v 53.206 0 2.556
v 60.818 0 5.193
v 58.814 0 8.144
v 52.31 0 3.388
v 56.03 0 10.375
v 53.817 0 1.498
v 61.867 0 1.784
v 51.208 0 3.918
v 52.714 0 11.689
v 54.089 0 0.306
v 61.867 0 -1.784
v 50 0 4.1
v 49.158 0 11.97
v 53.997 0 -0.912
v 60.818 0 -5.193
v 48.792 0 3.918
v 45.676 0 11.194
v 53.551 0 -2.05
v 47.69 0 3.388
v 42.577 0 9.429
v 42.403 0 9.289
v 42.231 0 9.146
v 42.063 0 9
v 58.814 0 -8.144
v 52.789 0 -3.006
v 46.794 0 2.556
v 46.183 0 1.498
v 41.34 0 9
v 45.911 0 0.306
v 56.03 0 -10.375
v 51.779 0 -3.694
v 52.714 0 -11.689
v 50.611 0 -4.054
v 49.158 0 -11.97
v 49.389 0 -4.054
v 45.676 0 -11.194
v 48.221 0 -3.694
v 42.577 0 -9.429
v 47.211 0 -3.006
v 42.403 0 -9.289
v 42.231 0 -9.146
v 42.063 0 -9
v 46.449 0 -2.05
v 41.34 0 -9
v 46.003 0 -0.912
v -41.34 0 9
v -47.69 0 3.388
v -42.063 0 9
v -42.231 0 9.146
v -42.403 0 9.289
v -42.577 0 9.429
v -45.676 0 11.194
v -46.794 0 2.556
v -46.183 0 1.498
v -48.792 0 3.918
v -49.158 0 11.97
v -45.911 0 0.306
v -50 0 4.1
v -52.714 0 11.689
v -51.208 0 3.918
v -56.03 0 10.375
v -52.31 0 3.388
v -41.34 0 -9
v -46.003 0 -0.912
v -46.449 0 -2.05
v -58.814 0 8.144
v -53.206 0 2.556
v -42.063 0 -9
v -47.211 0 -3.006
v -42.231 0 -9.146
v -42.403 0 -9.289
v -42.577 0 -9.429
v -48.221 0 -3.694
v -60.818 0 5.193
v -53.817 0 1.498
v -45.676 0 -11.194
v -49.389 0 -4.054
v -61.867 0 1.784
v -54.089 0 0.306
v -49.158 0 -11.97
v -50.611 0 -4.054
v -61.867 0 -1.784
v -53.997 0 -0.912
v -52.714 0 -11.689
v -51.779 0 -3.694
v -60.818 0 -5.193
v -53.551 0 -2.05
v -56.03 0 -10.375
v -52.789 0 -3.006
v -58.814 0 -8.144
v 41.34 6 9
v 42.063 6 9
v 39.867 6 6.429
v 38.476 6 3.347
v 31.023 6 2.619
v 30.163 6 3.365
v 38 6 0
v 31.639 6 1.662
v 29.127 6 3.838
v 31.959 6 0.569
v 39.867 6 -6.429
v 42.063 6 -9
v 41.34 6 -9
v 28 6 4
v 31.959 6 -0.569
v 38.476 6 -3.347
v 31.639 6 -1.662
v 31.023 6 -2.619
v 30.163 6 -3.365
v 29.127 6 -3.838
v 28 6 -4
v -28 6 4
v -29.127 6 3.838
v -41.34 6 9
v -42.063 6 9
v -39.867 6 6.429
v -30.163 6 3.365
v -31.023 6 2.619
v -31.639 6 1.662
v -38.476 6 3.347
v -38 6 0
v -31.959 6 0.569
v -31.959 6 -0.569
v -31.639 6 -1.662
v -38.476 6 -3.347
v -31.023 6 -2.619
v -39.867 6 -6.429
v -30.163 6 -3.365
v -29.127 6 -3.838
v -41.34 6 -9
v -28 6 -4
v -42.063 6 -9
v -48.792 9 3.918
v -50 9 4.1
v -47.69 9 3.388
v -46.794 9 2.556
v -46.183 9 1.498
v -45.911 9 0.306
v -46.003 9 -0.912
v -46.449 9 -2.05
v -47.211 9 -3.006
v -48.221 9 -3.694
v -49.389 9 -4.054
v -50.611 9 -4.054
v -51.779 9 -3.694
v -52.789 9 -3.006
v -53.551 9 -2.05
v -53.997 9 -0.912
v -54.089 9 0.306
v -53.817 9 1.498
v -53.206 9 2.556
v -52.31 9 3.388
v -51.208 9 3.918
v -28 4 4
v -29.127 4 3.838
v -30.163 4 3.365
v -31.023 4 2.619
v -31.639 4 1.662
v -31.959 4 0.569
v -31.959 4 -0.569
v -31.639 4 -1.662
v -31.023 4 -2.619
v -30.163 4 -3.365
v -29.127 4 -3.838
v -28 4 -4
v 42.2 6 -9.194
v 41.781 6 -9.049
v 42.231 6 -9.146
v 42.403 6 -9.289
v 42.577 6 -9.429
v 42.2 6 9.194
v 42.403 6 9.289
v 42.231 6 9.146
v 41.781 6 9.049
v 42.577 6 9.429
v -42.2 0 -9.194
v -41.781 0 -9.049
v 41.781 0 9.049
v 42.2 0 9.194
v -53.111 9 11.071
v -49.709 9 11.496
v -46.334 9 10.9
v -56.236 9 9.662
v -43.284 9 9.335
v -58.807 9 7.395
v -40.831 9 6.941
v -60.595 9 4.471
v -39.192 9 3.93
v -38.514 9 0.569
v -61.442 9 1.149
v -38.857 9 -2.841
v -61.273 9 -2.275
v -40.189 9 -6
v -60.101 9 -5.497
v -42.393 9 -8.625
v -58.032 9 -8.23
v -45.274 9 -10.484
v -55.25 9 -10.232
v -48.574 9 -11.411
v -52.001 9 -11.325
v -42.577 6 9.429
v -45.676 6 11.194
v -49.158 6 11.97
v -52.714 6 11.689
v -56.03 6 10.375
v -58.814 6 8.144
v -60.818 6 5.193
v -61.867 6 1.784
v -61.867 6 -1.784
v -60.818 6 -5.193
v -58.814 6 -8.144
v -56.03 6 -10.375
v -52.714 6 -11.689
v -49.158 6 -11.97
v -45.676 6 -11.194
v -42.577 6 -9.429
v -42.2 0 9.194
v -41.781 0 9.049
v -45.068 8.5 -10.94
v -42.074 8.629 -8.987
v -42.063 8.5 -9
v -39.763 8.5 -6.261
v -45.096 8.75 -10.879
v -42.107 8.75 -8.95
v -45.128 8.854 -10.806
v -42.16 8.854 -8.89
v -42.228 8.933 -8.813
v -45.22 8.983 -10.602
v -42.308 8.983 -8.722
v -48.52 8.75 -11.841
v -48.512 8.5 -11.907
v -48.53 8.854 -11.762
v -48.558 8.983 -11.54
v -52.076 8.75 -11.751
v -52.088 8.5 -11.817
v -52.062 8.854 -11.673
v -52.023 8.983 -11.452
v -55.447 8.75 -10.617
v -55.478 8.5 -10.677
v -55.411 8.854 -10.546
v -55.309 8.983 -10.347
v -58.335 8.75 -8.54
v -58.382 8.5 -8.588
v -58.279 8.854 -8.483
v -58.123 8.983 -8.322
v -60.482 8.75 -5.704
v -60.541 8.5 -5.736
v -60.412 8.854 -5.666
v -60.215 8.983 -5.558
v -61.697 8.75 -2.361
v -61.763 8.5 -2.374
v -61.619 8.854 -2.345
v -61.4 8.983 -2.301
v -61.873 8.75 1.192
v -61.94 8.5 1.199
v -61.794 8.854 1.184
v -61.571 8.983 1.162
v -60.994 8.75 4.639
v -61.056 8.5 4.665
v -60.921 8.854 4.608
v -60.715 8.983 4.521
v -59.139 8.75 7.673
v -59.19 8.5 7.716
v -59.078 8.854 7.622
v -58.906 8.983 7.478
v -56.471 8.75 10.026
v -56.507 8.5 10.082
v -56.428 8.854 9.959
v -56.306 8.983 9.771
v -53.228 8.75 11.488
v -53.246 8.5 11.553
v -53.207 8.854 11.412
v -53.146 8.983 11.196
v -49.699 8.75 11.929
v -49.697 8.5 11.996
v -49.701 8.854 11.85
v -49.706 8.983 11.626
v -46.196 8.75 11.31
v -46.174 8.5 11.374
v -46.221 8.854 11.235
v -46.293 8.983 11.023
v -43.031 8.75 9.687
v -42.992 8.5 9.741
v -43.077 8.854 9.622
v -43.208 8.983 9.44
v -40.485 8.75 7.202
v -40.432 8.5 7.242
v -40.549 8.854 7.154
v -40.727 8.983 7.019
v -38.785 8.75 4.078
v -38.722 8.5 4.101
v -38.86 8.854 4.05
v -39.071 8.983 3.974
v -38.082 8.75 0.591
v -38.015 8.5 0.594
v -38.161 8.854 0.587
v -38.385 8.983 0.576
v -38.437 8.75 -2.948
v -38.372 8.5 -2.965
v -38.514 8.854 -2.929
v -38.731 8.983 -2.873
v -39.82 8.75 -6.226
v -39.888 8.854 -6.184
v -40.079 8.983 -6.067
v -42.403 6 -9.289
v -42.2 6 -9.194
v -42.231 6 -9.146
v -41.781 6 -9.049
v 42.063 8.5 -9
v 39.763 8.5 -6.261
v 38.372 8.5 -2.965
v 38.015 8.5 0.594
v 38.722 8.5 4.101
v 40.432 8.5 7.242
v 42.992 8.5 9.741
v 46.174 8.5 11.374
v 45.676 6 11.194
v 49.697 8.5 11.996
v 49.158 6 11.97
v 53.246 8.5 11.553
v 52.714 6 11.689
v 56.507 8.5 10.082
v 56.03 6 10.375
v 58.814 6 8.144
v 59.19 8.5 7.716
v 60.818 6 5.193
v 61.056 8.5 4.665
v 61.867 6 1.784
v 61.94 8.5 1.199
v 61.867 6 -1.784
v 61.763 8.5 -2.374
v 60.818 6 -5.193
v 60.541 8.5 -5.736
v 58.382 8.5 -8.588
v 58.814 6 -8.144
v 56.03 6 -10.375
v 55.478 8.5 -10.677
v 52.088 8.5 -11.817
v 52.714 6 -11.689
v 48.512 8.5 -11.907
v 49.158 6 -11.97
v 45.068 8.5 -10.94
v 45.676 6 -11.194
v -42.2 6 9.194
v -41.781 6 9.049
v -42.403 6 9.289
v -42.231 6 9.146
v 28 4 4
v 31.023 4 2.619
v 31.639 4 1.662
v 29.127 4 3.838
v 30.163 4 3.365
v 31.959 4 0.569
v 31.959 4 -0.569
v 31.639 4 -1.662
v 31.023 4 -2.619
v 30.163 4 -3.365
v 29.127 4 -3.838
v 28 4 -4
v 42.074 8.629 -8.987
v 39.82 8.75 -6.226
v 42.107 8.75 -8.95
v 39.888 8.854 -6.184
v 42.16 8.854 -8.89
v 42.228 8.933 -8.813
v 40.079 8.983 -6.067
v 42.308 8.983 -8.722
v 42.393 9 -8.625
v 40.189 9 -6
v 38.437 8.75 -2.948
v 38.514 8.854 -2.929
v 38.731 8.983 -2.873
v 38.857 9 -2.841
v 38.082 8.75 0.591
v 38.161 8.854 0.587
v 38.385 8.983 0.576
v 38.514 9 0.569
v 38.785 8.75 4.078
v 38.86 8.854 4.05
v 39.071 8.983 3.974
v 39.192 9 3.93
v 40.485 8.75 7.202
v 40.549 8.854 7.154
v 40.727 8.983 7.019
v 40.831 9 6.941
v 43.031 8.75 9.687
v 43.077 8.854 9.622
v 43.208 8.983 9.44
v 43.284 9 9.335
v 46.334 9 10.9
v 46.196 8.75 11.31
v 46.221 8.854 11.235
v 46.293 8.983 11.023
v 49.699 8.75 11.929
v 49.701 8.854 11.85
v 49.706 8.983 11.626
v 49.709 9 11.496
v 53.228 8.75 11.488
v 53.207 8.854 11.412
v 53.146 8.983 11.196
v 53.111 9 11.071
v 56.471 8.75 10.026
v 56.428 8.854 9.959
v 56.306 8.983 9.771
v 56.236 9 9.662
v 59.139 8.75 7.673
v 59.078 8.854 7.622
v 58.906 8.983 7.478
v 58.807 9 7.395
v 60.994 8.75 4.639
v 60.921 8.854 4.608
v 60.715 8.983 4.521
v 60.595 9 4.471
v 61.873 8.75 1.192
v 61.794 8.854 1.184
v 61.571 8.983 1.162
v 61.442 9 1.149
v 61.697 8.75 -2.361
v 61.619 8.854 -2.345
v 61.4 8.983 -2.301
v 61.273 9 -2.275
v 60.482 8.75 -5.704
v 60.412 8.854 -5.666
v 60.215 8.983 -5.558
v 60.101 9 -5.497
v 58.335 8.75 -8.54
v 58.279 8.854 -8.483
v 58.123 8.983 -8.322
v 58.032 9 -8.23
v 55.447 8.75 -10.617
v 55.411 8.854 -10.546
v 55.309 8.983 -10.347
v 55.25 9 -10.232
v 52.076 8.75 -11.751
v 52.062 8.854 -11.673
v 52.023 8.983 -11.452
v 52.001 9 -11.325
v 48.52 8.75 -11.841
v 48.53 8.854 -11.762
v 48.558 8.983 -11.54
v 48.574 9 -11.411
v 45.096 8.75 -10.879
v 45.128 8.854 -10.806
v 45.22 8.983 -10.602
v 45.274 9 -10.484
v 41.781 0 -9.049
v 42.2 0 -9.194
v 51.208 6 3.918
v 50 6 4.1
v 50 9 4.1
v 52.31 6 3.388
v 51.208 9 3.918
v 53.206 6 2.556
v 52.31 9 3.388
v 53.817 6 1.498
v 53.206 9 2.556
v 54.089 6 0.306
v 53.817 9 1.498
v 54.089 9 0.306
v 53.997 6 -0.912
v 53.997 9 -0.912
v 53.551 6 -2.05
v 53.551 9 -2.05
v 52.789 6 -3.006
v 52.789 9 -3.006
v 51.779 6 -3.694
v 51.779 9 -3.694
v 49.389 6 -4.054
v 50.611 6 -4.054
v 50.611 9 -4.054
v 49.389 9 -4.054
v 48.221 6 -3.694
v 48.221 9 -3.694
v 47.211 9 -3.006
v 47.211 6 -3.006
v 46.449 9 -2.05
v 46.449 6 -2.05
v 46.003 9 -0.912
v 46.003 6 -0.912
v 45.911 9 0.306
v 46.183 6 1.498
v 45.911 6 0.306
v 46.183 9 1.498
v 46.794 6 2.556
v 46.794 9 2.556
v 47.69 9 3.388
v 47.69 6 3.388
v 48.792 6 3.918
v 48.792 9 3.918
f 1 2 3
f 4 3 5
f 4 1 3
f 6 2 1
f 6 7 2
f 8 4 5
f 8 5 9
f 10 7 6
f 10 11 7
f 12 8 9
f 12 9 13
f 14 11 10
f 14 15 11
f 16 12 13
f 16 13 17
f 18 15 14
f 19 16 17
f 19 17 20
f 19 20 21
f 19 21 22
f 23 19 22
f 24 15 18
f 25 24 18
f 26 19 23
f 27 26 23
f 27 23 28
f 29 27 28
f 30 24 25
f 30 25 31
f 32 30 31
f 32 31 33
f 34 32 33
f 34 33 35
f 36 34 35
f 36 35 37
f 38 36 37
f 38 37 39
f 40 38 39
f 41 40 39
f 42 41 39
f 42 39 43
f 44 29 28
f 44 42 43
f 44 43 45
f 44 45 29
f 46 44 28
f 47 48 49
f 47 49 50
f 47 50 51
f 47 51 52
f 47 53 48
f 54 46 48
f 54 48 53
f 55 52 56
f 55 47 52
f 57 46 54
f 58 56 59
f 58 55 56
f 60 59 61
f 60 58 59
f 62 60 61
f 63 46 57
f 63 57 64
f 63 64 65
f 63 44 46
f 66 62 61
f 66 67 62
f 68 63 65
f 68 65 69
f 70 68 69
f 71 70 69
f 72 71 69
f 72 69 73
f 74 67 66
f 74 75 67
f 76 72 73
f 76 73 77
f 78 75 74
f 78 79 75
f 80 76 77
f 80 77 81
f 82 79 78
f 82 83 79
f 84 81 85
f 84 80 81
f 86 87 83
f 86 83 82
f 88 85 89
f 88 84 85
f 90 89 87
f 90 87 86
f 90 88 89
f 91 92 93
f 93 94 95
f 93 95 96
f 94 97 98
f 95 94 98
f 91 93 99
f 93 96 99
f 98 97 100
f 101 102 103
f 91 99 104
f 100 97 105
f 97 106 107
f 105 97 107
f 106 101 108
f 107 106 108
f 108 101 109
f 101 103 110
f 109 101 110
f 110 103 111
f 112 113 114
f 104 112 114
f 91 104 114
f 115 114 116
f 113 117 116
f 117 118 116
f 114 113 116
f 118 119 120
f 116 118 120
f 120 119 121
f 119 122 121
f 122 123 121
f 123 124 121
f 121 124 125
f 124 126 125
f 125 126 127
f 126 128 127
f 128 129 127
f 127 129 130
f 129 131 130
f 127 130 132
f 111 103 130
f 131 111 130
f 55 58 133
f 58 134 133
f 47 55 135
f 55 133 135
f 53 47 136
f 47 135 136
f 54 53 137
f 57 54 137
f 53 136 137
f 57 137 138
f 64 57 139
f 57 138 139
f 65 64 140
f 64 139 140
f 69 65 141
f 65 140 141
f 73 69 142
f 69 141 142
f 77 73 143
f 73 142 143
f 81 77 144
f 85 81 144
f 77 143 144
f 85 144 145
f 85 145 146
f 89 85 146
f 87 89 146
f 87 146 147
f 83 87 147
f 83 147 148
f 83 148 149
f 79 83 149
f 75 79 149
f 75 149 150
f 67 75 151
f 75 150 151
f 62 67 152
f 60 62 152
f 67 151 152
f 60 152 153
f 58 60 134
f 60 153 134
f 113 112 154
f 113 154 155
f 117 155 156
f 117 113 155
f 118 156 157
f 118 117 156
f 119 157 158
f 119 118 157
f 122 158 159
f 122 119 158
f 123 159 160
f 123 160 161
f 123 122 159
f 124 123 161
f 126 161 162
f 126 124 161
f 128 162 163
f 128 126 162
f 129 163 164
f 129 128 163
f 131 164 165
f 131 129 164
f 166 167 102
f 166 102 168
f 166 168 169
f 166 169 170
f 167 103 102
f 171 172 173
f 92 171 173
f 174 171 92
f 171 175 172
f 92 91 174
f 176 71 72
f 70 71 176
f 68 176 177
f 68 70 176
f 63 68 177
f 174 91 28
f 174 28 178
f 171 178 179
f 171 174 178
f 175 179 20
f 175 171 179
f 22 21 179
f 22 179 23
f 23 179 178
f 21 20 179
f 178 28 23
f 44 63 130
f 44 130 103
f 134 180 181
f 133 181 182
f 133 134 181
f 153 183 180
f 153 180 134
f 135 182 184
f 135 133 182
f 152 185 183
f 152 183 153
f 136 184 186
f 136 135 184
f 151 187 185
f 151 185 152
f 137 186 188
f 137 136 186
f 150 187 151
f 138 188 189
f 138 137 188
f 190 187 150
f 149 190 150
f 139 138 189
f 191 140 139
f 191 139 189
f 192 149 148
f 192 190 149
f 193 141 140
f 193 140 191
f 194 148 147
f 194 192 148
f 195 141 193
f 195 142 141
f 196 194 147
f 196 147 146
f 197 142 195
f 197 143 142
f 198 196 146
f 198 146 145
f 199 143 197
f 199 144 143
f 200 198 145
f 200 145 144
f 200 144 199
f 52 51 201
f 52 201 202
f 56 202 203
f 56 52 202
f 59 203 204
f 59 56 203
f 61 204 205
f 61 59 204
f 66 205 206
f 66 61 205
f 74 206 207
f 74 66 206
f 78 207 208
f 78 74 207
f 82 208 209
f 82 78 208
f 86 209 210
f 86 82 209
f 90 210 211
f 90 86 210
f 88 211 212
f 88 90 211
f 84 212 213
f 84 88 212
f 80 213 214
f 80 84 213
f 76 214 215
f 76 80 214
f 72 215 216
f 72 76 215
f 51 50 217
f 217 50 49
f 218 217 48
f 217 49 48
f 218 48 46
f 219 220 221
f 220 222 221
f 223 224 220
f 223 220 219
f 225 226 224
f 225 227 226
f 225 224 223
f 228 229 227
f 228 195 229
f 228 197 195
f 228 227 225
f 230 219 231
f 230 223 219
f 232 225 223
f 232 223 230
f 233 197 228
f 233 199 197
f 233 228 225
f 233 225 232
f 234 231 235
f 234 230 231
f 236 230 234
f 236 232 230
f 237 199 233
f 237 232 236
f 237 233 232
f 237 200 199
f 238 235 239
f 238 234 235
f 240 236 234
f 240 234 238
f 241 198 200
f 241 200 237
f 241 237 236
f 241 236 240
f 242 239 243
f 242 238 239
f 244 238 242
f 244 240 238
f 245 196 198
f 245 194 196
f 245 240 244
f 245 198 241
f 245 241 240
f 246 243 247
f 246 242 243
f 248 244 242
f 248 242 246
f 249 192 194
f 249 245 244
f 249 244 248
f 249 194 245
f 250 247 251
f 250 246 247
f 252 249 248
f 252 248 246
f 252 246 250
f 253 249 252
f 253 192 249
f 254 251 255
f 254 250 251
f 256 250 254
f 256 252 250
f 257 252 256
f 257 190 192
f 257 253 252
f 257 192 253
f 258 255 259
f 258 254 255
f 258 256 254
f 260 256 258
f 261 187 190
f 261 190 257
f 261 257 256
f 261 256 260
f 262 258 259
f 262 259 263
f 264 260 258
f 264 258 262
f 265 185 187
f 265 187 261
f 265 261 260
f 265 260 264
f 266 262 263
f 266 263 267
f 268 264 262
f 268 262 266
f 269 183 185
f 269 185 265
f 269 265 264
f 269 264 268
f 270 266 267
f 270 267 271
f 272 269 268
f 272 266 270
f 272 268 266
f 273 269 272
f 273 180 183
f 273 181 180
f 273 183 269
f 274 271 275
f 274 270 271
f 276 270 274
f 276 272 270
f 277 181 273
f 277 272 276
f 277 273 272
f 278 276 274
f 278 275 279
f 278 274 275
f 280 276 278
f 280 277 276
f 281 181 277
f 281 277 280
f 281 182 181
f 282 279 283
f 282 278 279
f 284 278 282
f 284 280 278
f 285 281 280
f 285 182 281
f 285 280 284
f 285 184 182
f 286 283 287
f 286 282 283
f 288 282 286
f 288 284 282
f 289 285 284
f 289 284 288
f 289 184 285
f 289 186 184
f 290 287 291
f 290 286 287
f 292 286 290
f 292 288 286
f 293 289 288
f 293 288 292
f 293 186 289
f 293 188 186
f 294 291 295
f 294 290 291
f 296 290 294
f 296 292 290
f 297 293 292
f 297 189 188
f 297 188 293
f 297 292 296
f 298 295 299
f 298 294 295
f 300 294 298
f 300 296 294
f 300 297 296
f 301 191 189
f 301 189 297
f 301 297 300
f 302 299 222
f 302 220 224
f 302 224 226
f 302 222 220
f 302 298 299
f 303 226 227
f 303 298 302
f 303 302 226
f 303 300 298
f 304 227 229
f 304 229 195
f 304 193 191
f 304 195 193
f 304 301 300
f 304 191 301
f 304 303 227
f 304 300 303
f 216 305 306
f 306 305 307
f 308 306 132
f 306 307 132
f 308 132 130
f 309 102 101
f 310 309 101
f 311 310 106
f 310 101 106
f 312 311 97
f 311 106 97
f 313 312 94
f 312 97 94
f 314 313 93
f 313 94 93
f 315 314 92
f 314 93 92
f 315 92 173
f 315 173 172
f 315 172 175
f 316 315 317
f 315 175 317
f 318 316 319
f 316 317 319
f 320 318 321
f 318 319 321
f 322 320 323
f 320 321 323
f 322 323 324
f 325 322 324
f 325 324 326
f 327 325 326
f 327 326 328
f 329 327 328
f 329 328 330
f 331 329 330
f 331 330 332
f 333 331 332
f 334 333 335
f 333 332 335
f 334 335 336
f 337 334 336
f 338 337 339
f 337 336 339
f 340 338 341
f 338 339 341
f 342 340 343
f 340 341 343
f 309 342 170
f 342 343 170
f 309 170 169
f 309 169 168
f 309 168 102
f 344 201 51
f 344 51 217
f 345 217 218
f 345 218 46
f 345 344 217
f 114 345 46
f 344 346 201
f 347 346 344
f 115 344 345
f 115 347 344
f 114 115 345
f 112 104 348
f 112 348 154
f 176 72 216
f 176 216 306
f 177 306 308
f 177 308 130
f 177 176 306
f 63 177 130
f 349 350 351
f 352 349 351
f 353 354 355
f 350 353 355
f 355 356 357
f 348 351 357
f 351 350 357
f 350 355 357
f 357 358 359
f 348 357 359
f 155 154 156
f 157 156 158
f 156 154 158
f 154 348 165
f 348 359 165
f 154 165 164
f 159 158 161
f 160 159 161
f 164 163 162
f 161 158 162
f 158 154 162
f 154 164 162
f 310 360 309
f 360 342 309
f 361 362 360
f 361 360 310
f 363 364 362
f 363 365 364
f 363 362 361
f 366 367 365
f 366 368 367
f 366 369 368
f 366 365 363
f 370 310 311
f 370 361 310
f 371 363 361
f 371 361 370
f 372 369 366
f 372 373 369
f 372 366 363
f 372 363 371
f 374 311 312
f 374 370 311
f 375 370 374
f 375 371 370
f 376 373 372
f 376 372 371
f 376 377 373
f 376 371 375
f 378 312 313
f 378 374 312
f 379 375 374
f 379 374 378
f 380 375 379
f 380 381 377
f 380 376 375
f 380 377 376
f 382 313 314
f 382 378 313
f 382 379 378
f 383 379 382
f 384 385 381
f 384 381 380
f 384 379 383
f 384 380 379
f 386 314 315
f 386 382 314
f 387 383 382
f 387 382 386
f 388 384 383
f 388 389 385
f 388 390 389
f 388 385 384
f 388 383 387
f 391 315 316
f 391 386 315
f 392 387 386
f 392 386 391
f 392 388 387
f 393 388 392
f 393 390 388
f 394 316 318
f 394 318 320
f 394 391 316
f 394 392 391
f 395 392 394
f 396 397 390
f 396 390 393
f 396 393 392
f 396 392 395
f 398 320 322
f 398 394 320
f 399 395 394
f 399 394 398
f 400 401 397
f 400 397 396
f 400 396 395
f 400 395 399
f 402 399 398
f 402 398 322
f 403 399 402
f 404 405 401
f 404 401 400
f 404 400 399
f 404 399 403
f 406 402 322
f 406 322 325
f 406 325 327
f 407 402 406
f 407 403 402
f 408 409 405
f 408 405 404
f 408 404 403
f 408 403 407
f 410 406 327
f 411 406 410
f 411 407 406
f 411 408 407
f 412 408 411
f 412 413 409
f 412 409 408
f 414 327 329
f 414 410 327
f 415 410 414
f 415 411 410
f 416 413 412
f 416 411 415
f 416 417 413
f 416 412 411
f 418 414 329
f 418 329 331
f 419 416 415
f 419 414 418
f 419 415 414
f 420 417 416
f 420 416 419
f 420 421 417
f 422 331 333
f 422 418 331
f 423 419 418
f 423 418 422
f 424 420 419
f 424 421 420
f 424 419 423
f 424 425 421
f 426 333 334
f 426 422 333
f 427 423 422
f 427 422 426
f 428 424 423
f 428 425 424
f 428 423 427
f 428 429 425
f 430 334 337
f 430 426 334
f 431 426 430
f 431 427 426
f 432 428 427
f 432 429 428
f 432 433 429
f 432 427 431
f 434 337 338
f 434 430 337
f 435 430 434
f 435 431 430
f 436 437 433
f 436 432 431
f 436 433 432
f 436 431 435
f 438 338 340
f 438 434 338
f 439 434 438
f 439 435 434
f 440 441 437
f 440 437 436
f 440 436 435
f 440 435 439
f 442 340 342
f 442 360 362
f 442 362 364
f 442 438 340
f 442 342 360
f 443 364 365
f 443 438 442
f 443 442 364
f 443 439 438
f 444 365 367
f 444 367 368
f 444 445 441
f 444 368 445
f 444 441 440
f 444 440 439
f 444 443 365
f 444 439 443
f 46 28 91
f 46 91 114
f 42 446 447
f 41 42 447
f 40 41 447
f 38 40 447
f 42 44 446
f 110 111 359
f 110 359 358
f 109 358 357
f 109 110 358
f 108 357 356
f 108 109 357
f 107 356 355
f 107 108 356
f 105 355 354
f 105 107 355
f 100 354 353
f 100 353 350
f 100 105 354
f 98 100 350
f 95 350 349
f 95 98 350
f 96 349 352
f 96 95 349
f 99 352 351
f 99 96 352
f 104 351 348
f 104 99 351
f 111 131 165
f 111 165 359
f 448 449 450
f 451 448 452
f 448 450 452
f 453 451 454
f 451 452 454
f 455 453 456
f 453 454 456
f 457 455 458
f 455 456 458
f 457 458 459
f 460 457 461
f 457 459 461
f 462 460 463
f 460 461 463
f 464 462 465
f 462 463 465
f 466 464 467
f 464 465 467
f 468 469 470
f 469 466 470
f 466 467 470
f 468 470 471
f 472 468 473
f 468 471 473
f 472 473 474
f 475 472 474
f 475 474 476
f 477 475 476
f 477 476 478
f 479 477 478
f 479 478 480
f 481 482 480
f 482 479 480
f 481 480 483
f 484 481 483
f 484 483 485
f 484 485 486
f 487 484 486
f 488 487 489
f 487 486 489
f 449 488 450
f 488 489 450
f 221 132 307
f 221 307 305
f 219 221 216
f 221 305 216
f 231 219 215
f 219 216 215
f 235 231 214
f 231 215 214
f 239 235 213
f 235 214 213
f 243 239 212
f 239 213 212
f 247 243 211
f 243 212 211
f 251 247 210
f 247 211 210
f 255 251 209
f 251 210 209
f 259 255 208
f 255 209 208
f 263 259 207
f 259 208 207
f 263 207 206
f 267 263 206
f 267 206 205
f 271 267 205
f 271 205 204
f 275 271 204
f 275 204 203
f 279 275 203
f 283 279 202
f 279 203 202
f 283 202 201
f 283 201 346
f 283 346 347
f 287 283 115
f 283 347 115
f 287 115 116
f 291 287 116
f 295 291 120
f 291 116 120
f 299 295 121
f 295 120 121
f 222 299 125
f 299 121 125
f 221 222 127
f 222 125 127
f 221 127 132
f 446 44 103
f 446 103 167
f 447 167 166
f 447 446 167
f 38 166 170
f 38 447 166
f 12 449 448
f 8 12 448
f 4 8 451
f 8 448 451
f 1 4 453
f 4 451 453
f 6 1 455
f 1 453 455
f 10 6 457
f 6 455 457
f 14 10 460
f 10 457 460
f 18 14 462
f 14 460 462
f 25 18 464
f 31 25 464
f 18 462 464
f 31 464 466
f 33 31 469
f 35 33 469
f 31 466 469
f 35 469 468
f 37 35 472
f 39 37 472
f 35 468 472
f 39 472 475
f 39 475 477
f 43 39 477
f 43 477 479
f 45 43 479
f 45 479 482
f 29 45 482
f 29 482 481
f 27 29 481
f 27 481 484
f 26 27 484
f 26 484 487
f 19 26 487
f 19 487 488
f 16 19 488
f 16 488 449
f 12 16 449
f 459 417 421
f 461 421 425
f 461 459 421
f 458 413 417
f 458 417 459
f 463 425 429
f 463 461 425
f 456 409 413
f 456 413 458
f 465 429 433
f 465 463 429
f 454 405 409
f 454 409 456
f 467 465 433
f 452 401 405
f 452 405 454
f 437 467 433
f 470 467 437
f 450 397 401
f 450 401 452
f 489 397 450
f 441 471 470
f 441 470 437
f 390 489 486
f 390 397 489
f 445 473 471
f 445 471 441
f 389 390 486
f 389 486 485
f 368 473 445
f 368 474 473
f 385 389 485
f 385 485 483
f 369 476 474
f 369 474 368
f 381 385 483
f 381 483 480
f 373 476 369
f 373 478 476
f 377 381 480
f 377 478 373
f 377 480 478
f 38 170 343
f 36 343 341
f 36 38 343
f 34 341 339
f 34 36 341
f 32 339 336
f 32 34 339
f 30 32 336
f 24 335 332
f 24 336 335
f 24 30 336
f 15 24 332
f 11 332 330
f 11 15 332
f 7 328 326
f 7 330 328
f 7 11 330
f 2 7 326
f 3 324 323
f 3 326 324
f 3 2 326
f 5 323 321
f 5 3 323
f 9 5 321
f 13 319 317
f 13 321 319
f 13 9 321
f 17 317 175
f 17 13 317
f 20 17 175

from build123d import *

# Parameters (mm, degrees)
EXTRUDE_1_DEPTH     = 6
SKETCH_2_R          = 12
EXTRUDE_2_DEPTH     = 3
SKETCH_3_R          = 4.1
CUT_EXTRUDE_1_DEPTH = 64.788713735
CUT_EXTRUDE_2_DEPTH = 2
FILLET_1_R          = 0.5
SKETCH_5_R          = 12
SKETCH_5_R_2        = 4.1
EXTRUDE_3_DEPTH     = 6
FILLET_2_R          = 2


with BuildPart() as part:
    # 草图1 → 凸台-拉伸1 (new body)
    with BuildSketch(Plane(origin=(0, 0, 0), x_dir=(1, 0, 0), z_dir=(0, 1, 0))):
        with BuildLine():
            Line((-50, 9), (50, 9))
            ThreePointArc((50, 9), (59, 0), (50, -9))
            Line((50, -9), (-50, -9))
            ThreePointArc((-50, -9), (-59, 0), (-50, 9))
        make_face()
    extrude(amount=EXTRUDE_1_DEPTH)

    # 草图2 → 凸台-拉伸2 (add)
    with BuildSketch(Plane(origin=(0, 6, 0), x_dir=(1, 0, 0), z_dir=(0, 1, 0))):
        with Locations((-50, 0)):
            Circle(SKETCH_2_R)
        with Locations((50, 0)):
            Circle(SKETCH_2_R)
    extrude(amount=EXTRUDE_2_DEPTH)

    # 草图3 → 切除-拉伸1 (cut, through all)
    with BuildSketch(Plane(origin=(0, 9, 0), x_dir=(1, 0, 0), z_dir=(0, 1, 0))):
        with Locations((-50, 0)):
            Circle(SKETCH_3_R)
        with Locations((50, 0)):
            Circle(SKETCH_3_R)
    extrude(amount=-CUT_EXTRUDE_1_DEPTH, mode=Mode.SUBTRACT)

    # 草图4 → 切除-拉伸2 (cut)
    with BuildSketch(Plane(origin=(0, 6, 0), x_dir=(1, 0, 0), z_dir=(0, 1, 0))):
        with BuildLine():
            Line((-28, 4), (28, 4))
            ThreePointArc((28, 4), (32, 0), (28, -4))
            Line((28, -4), (-28, -4))
            ThreePointArc((-28, -4), (-32, 0), (-28, 4))
        make_face()
    extrude(amount=-CUT_EXTRUDE_2_DEPTH, mode=Mode.SUBTRACT)

    # 圆角1
    fillet_1_edges = [part.edges().sort_by_distance(p)[0] for p in [
        (38, 9, 0),
        (-62, 9, 0),
    ]]
    fillet(fillet_1_edges, radius=FILLET_1_R)

    # 草图5 → 凸台-拉伸3 (add)
    # profile 1 of 2: a face of its own
    with BuildSketch(Plane.XZ):
        with Locations((-50, 0)):
            Circle(SKETCH_5_R)
        with Locations((-50, 0)):
            Circle(SKETCH_5_R_2, mode=Mode.SUBTRACT)
    # profile 2 of 2: a face of its own
    with BuildSketch(Plane.XZ):
        with Locations((50, 0)):
            Circle(SKETCH_5_R)
        with Locations((50, 0)):
            Circle(SKETCH_5_R_2, mode=Mode.SUBTRACT)
    extrude(amount=-EXTRUDE_3_DEPTH)

    # 圆角2
    fillet_2_edges = [part.edges().sort_by_distance(p)[0] for p in [
        (-42.062746067, 3, -9),
        (42.062746067, 3, -9),
        (42.062746067, 3, 9),
        (-42.062746067, 3, 9),
    ]]
    fillet(fillet_2_edges, radius=FILLET_2_R)


solid = part.part
